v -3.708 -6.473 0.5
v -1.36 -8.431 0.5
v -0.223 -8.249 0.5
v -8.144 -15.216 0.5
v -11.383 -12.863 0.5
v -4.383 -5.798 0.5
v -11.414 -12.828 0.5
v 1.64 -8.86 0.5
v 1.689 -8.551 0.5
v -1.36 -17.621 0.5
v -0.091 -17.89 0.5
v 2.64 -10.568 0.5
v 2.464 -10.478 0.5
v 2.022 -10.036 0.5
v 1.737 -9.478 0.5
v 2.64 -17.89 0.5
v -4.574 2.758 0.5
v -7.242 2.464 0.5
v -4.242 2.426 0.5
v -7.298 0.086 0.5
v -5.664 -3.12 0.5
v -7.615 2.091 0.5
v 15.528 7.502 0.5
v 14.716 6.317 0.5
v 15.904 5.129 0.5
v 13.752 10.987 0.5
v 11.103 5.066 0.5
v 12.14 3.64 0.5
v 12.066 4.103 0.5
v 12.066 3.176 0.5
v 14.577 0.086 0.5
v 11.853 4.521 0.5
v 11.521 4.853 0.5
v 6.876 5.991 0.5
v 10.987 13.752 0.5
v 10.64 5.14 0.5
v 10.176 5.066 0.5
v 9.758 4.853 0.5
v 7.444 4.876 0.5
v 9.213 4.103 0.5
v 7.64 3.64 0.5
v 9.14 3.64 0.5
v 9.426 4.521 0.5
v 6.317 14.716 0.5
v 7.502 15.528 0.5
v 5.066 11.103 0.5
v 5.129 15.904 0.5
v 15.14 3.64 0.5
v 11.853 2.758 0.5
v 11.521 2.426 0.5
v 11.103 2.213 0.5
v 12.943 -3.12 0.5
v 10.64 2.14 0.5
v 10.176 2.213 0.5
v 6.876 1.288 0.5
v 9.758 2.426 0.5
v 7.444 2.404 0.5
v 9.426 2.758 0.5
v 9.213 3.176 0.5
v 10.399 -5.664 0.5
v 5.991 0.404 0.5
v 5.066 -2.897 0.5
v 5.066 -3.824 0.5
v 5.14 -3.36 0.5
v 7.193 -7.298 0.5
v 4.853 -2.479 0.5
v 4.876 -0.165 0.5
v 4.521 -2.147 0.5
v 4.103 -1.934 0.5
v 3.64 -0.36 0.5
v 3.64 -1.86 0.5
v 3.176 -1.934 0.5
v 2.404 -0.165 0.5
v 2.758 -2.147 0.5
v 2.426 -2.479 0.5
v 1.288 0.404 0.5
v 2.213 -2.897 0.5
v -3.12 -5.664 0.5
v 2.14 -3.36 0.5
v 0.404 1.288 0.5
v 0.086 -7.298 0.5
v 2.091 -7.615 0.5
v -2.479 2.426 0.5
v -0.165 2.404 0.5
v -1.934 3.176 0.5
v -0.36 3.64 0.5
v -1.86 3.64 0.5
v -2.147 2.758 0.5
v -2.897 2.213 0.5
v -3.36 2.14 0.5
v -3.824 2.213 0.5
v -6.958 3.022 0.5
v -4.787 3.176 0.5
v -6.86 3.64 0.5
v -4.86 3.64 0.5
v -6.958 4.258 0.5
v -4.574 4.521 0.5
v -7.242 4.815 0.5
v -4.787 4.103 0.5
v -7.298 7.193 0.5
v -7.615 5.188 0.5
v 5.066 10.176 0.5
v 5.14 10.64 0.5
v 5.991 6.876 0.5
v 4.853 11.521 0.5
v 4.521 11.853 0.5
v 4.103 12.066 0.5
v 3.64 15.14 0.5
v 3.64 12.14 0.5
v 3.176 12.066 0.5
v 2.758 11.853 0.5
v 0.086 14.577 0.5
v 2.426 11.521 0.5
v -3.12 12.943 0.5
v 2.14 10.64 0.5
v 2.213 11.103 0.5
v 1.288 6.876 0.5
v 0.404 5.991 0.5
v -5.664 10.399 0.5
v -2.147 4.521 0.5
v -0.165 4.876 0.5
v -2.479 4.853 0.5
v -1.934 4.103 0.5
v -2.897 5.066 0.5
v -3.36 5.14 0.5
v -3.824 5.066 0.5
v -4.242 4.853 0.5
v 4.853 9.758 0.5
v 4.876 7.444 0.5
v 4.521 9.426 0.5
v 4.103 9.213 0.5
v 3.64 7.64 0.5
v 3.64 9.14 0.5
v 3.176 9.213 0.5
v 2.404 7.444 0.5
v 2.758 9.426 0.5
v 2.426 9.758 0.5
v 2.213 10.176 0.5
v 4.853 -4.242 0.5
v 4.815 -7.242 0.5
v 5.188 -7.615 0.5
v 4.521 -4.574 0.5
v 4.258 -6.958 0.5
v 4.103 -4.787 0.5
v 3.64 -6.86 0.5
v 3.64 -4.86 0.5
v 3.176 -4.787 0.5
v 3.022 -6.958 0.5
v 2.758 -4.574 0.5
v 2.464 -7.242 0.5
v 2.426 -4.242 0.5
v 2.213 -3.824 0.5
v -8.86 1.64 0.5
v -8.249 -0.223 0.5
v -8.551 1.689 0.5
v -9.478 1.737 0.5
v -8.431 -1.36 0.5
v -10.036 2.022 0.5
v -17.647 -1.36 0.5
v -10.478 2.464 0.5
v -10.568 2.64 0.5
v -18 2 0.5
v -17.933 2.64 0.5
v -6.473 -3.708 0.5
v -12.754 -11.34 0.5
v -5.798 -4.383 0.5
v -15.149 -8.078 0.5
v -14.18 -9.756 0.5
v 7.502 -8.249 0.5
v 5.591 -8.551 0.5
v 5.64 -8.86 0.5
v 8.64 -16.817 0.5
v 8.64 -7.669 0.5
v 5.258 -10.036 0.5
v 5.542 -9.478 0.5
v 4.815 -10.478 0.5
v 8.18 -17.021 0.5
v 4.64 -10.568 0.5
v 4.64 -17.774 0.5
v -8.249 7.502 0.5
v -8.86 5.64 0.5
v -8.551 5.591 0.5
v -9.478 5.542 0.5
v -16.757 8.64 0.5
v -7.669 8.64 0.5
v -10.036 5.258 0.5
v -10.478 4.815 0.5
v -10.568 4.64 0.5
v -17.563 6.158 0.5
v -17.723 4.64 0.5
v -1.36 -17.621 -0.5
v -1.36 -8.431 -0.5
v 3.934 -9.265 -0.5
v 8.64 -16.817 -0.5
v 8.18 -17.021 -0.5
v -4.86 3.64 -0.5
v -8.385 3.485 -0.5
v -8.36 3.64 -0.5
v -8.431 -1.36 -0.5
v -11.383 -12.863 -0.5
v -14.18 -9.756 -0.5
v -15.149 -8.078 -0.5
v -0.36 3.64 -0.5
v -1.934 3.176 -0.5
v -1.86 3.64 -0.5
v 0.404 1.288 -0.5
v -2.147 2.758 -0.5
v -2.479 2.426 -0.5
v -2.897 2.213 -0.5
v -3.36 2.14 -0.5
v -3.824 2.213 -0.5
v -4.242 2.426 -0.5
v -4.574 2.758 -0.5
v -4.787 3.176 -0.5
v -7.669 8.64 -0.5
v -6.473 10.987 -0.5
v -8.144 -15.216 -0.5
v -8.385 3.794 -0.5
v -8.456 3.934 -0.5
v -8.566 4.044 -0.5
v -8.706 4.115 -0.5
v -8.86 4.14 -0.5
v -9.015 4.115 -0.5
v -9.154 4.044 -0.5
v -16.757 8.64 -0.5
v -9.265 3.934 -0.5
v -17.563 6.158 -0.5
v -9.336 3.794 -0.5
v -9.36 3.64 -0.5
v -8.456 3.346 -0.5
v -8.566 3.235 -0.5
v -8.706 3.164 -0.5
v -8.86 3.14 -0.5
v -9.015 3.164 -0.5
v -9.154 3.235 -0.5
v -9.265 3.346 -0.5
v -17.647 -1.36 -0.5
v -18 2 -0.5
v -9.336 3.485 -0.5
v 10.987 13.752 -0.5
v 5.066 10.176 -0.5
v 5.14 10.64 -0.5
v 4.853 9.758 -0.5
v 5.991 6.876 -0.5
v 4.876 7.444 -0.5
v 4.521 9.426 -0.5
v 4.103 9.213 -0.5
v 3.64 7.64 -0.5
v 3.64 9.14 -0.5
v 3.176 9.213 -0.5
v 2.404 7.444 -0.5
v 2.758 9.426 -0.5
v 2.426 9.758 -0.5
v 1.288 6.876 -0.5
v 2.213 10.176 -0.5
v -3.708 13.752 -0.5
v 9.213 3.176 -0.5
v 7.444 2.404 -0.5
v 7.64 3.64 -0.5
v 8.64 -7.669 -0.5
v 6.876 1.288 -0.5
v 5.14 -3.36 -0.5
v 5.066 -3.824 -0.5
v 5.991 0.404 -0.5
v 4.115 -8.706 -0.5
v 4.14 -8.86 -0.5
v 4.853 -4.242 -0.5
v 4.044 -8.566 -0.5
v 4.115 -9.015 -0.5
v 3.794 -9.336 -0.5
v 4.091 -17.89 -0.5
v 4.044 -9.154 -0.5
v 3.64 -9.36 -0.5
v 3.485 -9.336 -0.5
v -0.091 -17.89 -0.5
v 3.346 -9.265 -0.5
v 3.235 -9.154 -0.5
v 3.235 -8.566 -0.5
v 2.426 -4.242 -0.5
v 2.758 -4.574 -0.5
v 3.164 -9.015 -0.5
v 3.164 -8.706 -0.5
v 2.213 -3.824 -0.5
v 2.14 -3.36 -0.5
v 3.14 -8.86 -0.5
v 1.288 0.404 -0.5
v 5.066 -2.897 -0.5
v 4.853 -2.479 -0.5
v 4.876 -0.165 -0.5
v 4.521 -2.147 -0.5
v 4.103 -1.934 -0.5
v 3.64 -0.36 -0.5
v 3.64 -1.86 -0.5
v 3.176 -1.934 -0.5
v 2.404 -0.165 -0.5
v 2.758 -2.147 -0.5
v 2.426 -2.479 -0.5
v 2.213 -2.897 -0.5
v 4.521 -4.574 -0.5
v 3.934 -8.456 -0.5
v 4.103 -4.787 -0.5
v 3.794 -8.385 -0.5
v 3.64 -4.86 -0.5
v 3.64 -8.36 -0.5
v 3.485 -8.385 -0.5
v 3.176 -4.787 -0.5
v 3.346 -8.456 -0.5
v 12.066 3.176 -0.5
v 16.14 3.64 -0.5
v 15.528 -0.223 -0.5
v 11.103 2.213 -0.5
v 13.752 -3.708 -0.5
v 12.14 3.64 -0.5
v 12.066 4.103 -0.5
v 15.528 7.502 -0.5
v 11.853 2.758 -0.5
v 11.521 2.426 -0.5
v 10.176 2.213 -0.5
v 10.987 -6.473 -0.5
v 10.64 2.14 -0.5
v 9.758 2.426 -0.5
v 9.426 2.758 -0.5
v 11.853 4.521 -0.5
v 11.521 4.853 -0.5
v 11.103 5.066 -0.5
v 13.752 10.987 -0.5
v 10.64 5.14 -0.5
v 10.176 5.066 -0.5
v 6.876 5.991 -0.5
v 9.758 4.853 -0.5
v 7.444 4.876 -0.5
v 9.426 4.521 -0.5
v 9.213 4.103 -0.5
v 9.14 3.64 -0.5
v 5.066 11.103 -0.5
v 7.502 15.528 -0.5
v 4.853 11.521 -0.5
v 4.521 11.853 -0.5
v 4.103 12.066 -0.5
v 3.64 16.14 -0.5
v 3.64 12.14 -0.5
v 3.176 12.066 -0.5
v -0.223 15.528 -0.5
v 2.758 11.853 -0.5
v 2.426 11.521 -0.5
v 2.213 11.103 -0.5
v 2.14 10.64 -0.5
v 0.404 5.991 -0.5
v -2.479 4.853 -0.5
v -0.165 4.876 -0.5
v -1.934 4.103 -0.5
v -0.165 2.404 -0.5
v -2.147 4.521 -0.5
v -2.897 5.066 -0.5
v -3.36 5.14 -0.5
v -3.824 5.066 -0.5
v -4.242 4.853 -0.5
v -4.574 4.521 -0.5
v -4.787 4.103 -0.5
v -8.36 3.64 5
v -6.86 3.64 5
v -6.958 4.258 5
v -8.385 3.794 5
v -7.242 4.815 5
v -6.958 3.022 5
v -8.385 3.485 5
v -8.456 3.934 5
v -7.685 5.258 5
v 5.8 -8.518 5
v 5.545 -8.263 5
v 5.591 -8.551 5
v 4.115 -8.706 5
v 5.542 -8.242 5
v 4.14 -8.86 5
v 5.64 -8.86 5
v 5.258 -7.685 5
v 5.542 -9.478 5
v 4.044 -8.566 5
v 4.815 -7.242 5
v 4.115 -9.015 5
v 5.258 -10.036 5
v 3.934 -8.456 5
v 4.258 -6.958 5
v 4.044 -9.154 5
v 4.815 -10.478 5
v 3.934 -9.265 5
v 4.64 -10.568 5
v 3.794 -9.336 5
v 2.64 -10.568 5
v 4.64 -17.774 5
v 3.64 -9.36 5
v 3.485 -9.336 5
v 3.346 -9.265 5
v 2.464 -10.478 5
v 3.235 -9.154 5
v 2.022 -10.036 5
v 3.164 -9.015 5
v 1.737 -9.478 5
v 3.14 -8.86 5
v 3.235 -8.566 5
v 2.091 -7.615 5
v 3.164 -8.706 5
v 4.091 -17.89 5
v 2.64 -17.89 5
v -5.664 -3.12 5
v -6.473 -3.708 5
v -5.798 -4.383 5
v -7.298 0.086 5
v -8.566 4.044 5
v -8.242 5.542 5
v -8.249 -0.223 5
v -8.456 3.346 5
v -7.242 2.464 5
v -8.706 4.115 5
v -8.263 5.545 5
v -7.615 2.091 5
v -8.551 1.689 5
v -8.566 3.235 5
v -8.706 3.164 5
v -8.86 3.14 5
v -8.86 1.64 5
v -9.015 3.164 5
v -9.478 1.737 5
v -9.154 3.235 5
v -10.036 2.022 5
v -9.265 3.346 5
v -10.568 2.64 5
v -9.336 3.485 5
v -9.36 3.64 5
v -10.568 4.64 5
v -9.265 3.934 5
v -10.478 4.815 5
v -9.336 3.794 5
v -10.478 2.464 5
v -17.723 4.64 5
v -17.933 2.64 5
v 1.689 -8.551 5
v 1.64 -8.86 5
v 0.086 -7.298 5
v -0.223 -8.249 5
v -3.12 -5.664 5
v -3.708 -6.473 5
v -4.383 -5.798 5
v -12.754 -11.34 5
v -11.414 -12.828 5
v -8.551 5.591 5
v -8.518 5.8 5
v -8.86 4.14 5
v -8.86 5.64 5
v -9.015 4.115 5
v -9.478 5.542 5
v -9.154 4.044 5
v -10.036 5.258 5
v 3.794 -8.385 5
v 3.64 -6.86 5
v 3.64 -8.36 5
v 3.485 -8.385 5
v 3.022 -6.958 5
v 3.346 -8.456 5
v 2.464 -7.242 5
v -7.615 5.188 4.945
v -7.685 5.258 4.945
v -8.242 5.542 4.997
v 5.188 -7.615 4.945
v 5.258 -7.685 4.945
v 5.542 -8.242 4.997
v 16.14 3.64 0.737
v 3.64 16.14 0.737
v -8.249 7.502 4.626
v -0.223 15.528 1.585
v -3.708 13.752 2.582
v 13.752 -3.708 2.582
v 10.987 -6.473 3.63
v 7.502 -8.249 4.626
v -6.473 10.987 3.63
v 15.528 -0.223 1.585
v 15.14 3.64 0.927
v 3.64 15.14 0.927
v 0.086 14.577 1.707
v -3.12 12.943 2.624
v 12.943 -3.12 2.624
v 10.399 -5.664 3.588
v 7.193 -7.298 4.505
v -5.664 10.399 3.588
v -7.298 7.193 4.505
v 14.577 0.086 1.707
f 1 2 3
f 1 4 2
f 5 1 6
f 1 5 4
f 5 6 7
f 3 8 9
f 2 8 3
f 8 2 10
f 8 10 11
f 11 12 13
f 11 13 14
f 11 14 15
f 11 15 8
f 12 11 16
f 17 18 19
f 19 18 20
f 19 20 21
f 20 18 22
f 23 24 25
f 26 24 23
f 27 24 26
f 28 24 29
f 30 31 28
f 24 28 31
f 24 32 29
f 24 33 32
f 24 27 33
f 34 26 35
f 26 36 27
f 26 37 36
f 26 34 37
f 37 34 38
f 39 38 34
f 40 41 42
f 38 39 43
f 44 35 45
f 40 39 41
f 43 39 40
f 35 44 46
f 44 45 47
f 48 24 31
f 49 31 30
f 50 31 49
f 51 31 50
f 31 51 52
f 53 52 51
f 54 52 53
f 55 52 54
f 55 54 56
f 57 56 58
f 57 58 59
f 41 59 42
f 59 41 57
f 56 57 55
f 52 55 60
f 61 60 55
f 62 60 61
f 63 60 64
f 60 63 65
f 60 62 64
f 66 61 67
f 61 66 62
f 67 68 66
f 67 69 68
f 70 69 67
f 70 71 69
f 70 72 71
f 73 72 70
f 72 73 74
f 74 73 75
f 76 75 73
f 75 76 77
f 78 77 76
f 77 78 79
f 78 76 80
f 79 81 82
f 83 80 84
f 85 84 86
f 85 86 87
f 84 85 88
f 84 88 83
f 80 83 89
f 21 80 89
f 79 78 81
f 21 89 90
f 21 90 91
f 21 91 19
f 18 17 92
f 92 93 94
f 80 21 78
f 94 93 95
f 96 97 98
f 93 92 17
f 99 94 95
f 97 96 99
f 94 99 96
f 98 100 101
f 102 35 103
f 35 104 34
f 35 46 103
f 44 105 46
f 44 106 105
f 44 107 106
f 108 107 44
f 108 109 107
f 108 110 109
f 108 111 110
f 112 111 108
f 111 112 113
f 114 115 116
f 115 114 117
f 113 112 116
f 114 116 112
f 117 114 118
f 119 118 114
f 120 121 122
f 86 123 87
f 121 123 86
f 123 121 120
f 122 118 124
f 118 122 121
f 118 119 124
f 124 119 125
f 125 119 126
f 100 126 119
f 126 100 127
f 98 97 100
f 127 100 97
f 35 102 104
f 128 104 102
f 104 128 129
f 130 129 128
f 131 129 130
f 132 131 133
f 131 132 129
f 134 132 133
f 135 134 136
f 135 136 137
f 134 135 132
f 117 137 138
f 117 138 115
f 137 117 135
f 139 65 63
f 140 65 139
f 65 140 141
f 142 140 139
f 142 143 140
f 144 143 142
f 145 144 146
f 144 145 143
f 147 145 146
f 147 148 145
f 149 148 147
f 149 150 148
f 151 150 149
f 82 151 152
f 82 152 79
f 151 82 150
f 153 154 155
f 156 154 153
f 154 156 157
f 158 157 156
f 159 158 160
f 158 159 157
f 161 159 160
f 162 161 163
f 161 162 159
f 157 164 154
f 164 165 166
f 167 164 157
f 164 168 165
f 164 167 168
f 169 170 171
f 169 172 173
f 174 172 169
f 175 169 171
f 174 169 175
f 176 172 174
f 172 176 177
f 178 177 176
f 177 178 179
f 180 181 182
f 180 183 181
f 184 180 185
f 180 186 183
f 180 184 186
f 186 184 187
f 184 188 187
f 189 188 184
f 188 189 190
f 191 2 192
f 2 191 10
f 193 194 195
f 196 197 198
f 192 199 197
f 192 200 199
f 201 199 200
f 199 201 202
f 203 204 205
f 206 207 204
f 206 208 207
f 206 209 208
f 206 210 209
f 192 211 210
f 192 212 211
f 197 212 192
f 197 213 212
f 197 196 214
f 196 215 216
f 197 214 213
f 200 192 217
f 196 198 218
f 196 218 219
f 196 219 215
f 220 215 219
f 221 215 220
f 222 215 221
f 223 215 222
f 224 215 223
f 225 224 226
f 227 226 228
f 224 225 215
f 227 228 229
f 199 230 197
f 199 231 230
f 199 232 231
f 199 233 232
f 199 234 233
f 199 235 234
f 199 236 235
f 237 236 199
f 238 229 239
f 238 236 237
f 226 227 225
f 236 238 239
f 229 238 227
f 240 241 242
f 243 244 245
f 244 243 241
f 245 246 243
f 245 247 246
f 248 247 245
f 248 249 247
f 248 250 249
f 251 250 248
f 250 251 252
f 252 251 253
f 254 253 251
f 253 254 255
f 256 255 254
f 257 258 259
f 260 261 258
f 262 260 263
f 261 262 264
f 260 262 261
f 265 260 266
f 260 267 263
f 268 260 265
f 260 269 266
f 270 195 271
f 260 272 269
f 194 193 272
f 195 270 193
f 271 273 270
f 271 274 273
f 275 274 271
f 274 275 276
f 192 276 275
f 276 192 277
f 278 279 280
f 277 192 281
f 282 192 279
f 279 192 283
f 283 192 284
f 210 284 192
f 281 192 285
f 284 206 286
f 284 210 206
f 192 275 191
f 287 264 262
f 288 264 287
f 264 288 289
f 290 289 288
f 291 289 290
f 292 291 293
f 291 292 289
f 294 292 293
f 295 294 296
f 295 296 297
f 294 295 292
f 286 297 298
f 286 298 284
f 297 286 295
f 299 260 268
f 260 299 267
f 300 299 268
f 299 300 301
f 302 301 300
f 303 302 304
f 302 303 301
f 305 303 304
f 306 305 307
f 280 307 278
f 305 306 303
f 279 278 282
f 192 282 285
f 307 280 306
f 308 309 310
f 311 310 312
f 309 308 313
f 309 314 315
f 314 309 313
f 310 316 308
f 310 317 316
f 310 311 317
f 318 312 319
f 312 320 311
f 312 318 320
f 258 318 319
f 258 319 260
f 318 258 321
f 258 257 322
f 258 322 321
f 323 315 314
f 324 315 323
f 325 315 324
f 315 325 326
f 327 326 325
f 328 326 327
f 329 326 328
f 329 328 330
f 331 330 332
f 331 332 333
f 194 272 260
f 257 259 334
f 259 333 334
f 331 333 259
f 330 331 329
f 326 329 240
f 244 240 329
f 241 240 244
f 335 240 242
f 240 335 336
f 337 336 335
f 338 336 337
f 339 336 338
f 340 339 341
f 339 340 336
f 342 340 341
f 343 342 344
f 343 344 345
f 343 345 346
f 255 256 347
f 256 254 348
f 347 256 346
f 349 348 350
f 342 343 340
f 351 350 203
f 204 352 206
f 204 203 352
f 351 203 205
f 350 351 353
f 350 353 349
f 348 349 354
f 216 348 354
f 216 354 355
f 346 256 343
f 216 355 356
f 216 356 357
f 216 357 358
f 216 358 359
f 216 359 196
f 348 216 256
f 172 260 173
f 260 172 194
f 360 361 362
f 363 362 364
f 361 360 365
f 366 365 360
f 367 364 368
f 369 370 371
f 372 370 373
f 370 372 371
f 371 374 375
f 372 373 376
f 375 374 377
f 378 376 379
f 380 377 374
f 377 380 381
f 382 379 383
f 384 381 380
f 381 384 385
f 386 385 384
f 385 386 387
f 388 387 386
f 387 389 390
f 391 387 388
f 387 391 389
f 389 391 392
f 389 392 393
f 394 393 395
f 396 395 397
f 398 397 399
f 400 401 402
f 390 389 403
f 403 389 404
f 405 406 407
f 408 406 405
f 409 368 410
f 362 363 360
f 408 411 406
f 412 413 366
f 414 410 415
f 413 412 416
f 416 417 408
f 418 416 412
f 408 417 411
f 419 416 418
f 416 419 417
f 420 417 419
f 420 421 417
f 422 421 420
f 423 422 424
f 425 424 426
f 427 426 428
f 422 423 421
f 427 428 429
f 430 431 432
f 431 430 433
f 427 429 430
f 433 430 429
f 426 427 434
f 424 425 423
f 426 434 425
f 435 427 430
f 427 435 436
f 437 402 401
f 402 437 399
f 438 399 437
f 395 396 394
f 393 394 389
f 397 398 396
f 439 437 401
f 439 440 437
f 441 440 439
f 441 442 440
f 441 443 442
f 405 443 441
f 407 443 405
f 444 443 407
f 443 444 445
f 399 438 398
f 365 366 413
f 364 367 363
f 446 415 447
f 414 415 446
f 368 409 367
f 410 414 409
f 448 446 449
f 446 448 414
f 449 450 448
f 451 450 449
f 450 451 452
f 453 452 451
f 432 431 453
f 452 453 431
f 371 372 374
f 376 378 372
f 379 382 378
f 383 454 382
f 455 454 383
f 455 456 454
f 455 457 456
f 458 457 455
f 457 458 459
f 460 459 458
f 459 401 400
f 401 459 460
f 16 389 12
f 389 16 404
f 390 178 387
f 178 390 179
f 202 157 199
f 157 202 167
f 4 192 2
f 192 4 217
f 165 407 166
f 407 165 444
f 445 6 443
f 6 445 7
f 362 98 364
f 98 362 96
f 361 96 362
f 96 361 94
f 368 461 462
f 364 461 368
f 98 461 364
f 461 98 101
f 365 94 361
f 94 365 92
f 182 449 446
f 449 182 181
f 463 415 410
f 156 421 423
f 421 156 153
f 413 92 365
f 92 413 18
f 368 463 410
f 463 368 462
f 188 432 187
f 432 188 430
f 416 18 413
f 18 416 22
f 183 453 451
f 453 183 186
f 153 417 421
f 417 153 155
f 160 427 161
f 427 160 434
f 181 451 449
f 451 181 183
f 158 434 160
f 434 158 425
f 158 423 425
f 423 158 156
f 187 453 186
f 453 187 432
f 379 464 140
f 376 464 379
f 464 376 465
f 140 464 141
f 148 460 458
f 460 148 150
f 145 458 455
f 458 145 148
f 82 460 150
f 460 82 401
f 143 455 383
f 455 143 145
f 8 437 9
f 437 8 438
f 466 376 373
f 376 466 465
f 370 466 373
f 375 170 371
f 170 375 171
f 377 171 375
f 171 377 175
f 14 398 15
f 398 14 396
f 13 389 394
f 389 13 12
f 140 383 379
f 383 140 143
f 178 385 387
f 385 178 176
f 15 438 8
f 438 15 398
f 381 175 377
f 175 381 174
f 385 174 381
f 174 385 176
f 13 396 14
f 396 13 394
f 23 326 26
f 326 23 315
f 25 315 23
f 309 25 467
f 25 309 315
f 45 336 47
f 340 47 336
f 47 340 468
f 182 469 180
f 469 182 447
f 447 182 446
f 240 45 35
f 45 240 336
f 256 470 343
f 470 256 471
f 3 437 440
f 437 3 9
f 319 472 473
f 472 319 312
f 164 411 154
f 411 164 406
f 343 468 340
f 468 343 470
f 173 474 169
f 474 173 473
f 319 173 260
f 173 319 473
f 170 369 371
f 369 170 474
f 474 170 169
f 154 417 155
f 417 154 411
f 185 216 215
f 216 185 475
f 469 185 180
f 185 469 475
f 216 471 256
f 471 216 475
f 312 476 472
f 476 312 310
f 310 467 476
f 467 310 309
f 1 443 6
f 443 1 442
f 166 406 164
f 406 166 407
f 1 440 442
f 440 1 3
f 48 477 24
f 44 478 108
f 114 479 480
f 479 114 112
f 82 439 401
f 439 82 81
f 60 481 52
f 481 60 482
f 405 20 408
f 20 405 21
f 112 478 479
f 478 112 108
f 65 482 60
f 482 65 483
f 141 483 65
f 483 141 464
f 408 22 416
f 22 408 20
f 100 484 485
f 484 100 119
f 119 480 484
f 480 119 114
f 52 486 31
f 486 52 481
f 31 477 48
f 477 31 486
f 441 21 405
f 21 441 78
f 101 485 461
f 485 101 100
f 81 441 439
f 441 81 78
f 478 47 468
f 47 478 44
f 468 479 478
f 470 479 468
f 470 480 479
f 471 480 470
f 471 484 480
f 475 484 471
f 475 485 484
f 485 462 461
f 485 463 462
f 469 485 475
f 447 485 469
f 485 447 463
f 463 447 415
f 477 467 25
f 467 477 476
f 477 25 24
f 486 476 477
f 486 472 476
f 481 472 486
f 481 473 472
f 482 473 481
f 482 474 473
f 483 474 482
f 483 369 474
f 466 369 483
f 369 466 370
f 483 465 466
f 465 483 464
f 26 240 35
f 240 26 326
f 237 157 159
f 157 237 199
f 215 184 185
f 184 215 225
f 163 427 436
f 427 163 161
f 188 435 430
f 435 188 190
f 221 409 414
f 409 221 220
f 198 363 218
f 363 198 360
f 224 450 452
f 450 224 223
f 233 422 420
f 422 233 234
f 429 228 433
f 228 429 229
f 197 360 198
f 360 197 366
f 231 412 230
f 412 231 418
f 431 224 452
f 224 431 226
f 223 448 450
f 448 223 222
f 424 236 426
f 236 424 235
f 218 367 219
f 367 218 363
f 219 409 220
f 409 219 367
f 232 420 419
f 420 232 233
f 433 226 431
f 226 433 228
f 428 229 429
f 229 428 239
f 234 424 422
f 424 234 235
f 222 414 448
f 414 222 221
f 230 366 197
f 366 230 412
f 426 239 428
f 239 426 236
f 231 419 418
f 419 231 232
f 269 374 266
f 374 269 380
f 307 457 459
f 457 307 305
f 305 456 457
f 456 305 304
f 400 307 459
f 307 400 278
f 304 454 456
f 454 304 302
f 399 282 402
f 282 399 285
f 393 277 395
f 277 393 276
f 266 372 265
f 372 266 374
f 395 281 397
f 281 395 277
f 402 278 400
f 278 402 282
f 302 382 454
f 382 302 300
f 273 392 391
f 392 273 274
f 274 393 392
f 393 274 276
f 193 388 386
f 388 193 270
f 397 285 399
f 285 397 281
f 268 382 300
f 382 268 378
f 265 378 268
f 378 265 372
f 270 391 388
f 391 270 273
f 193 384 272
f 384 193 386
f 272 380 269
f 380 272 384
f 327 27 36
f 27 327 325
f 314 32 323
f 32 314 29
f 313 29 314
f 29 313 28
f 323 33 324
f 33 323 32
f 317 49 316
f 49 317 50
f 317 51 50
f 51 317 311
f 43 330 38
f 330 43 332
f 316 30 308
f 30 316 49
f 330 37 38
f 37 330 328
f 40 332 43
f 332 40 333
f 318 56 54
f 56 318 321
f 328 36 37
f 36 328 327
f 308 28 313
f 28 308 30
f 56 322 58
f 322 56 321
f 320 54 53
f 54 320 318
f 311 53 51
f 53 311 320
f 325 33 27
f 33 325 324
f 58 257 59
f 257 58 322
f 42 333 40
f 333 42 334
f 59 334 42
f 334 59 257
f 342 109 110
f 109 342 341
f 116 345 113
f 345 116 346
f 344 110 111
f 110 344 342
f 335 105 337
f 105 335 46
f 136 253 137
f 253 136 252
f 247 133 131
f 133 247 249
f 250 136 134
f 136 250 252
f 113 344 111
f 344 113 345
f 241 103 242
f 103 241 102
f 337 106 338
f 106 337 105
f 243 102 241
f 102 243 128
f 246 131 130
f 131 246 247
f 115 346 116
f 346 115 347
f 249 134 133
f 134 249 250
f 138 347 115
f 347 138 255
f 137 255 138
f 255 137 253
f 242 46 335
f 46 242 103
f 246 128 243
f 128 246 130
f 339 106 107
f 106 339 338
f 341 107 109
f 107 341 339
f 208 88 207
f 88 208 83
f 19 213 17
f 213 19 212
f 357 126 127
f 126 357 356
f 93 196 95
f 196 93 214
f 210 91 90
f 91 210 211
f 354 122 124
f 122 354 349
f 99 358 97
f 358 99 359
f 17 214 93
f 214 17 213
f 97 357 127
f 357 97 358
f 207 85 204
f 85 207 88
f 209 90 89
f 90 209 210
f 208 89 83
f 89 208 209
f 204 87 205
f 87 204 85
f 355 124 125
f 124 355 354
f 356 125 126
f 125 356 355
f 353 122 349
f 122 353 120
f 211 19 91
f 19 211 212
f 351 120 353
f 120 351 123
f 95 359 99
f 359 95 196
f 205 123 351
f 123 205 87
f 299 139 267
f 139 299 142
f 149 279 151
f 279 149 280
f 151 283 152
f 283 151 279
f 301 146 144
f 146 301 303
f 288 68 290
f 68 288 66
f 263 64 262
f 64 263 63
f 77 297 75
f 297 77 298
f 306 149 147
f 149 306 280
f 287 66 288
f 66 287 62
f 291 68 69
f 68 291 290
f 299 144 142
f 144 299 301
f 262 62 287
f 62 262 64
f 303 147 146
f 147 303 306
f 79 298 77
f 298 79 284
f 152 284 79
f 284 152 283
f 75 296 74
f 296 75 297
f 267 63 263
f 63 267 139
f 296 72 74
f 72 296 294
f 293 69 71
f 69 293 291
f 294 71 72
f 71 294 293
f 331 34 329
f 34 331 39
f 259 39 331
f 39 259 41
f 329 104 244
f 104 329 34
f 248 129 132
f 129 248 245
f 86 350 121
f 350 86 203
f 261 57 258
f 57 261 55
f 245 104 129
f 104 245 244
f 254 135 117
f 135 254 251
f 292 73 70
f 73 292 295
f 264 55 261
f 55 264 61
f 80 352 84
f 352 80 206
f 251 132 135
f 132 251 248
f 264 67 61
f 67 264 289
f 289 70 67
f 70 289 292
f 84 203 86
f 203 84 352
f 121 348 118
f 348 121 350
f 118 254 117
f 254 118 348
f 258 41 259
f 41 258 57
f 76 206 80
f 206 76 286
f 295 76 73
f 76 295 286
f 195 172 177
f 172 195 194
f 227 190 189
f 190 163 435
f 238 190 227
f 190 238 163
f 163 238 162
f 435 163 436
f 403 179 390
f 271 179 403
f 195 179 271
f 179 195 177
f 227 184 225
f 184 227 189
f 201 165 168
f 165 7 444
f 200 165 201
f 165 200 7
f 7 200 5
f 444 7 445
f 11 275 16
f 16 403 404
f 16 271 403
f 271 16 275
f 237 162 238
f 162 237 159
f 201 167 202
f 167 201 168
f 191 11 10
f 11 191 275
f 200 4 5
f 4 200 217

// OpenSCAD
// file: frame_cuadrado.scad
N=4;
$fn=20;
Off=1;

module distribuye_rotando(radio, n) {
	for (i=[0:n-1]) rotate(i*360/n) translate([radio, 0, 0]) children();
}

module montura(modo, TotalDia, canteada=true) {
	// diametro del hueco del centro 
	CentroDia=8;
	// diametro del agujero de los 4 tornillos
	TornilloDia=3;
	// distancia entre dos aguneros de tornillos
	TornilloDistancia=14;
	// altura total de la montura
	Altura=1;
	
	PerfilAlto=5;
	PerfilAncho=1;

	if (modo == "crea") {
		// base plana de la montura del motor
		cylinder(r=TotalDia/2,h=Altura, center=true);

		// anillo alrededor del motor
		difference() {
			translate([0, 0, PerfilAlto/2])
			cylinder(r=TotalDia/2,h=PerfilAlto, center=true);
	
			translate([0, 0, 2.5])
			cylinder(r=TotalDia/2-PerfilAncho,h=PerfilAlto+2*Off, center=true);

			if (canteada) {
				// un plano inclinado para cortar inclinadamente
				rotate([0, 0, 180/N])
				rotate([0, 15, 0])
		      translate([0, 0, 4*PerfilAlto+3])
				cube([TotalDia, TotalDia, 40], center=true);
			}
		}
	}
	if (modo == "hueco") {
	   // hueco central
	   cylinder(r=CentroDia/2,h=Altura+2*Off, center=true);

	   // huecos 4 tornillos
		distribuye_rotando(TornilloDistancia/2, 4)
	   cylinder(r=TornilloDia/2,h=Altura+2*Off, center=true);
	}
}

module patas(modo, MontaTotalDia) {
	Alto=5;
	Diametro=4;
	Agujero=1;
	beta=180/N;
	gamma=90-180/N;
	if (modo == "crea") {
		for (angulo=[-1,1])
			rotate(beta+gamma*angulo)
		   translate([-MontaTotalDia/2, 0, Alto/2])
			cylinder(r=Diametro/2, h=Alto, center=true);
	}
	if (modo == "hueco") {
		for (angulo=[-1,1])
			rotate(beta+gamma*angulo)
	   	translate([-MontaTotalDia/2, 0, Alto/2])
			cylinder(r=Agujero/2, h=Alto+2*Off, center=true);
	}
}

module cable(modo, alto, base) {
   DiametroIntermedio=7;
	DiametroExterior=9;
	Agujero=5;
	Alto=2;

	if (modo == "crea") {
		translate([0, 0, alto-Alto/2])
		cylinder(r=DiametroExterior/2, h=Alto, center=true);
	}
	if (modo == "hueco") {
		// taladro central
		translate([0, 0, alto/2])
		cylinder(r=Agujero/2, h=alto+2*Off, center=true);
	}
}

module lados(modo, radio, MontaTotalDia) {
	// dimensiones de cada lado
	LadoAncho=10;
	LadoAlto=1;
	LadoPerfilAncho=2;
	LadoPerfilAlto=5;
   lado=radio*sqrt(2*(1-cos(360/N)));
   apotema=radio*cos(360/N/2);
	lado2=lado-MontaTotalDia*0.9;
	if (modo == "crea") {
		// parte plana cuadrada exterior
		translate([apotema, 0, -LadoAlto/2])
		rotate(90)
		translate([-lado/2, -LadoAncho/2, 0])
		cube([lado, LadoAncho, LadoAlto]);

      // nervio superior cuadrado exterior
		translate([apotema, 0, -LadoPerfilAlto/2])
		rotate(90)
		translate([-lado2/2, -LadoPerfilAncho/2, LadoPerfilAlto/2])
		cube([lado2, LadoPerfilAncho, LadoPerfilAlto]);
	}
	if (modo == "hueco") {
	}
}

module diagonales(modo, radio, MontaTotalDia) {
	// dimensiones de cada diagonal
	DiagonalAlto=1;
	DiagonalAncho=10;
	DiagonalPerfilAncho=2;
	DiagonalPerfilAlto=5;

	if (modo == "crea") {
		// parte plana diagonales
		rotate([0, 0, 180/N])
		translate([radio/2, 0, 0])
		cube([radio, DiagonalAncho, DiagonalAlto], center=true);

		// nervio superior diagonales
		rotate([0, 0, 180/N])
		translate([radio/2-MontaTotalDia/4, 0, DiagonalPerfilAlto/2])
		cube([radio-MontaTotalDia/2*0.85, DiagonalPerfilAncho, DiagonalPerfilAlto], center=true);

		cable("crea", DiagonalPerfilAlto, DiagonalAlto);
	}
	if (modo == "hueco") {
		cable("hueco", DiagonalPerfilAlto, DiagonalAlto);
	}
}

module for_rotate() {
	for (i=[0:N-1])
	rotate(i*360/N)
	children();
}

module rotate_trans(radio) {
	rotate(180/N) 
   translate([radio, 0, 0])
	rotate(-180/N)
	children();
}

module frame(modo, radio=90, MontaTotalDia=25) {
	if (modo == "crea") {
		for_rotate() {
			lados("crea", radio, MontaTotalDia);
			diagonales("crea", radio, MontaTotalDia);
			rotate_trans(radio) patas("crea", MontaTotalDia);
			rotate_trans(radio) montura("crea", MontaTotalDia);
		}
	}
	if (modo == "hueco") {
		for_rotate() {
			rotate_trans(radio) patas("hueco", MontaTotalDia);
			rotate_trans(radio) montura("hueco", MontaTotalDia);
		}
		diagonales("hueco", radio, MontaTotalDia);
	}
}

difference() { frame("crea"); frame("hueco"); }
//difference() { patas("crea"); patas("hueco"); }
//difference() { cable("crea", 5); cable("hueco", 1); }
//difference() { montura("crea", 20); montura("hueco", 20); }
// main file
use <frame_cuadrado.scad>;

module presenta_cacho() {
    translate([-60,-60,0])
    intersection() {
        difference() { frame("crea"); frame("hueco"); }
        translate([62,62,0])
        cylinder(r=20, h=10, center=true);
    }
}

presenta_cacho();
